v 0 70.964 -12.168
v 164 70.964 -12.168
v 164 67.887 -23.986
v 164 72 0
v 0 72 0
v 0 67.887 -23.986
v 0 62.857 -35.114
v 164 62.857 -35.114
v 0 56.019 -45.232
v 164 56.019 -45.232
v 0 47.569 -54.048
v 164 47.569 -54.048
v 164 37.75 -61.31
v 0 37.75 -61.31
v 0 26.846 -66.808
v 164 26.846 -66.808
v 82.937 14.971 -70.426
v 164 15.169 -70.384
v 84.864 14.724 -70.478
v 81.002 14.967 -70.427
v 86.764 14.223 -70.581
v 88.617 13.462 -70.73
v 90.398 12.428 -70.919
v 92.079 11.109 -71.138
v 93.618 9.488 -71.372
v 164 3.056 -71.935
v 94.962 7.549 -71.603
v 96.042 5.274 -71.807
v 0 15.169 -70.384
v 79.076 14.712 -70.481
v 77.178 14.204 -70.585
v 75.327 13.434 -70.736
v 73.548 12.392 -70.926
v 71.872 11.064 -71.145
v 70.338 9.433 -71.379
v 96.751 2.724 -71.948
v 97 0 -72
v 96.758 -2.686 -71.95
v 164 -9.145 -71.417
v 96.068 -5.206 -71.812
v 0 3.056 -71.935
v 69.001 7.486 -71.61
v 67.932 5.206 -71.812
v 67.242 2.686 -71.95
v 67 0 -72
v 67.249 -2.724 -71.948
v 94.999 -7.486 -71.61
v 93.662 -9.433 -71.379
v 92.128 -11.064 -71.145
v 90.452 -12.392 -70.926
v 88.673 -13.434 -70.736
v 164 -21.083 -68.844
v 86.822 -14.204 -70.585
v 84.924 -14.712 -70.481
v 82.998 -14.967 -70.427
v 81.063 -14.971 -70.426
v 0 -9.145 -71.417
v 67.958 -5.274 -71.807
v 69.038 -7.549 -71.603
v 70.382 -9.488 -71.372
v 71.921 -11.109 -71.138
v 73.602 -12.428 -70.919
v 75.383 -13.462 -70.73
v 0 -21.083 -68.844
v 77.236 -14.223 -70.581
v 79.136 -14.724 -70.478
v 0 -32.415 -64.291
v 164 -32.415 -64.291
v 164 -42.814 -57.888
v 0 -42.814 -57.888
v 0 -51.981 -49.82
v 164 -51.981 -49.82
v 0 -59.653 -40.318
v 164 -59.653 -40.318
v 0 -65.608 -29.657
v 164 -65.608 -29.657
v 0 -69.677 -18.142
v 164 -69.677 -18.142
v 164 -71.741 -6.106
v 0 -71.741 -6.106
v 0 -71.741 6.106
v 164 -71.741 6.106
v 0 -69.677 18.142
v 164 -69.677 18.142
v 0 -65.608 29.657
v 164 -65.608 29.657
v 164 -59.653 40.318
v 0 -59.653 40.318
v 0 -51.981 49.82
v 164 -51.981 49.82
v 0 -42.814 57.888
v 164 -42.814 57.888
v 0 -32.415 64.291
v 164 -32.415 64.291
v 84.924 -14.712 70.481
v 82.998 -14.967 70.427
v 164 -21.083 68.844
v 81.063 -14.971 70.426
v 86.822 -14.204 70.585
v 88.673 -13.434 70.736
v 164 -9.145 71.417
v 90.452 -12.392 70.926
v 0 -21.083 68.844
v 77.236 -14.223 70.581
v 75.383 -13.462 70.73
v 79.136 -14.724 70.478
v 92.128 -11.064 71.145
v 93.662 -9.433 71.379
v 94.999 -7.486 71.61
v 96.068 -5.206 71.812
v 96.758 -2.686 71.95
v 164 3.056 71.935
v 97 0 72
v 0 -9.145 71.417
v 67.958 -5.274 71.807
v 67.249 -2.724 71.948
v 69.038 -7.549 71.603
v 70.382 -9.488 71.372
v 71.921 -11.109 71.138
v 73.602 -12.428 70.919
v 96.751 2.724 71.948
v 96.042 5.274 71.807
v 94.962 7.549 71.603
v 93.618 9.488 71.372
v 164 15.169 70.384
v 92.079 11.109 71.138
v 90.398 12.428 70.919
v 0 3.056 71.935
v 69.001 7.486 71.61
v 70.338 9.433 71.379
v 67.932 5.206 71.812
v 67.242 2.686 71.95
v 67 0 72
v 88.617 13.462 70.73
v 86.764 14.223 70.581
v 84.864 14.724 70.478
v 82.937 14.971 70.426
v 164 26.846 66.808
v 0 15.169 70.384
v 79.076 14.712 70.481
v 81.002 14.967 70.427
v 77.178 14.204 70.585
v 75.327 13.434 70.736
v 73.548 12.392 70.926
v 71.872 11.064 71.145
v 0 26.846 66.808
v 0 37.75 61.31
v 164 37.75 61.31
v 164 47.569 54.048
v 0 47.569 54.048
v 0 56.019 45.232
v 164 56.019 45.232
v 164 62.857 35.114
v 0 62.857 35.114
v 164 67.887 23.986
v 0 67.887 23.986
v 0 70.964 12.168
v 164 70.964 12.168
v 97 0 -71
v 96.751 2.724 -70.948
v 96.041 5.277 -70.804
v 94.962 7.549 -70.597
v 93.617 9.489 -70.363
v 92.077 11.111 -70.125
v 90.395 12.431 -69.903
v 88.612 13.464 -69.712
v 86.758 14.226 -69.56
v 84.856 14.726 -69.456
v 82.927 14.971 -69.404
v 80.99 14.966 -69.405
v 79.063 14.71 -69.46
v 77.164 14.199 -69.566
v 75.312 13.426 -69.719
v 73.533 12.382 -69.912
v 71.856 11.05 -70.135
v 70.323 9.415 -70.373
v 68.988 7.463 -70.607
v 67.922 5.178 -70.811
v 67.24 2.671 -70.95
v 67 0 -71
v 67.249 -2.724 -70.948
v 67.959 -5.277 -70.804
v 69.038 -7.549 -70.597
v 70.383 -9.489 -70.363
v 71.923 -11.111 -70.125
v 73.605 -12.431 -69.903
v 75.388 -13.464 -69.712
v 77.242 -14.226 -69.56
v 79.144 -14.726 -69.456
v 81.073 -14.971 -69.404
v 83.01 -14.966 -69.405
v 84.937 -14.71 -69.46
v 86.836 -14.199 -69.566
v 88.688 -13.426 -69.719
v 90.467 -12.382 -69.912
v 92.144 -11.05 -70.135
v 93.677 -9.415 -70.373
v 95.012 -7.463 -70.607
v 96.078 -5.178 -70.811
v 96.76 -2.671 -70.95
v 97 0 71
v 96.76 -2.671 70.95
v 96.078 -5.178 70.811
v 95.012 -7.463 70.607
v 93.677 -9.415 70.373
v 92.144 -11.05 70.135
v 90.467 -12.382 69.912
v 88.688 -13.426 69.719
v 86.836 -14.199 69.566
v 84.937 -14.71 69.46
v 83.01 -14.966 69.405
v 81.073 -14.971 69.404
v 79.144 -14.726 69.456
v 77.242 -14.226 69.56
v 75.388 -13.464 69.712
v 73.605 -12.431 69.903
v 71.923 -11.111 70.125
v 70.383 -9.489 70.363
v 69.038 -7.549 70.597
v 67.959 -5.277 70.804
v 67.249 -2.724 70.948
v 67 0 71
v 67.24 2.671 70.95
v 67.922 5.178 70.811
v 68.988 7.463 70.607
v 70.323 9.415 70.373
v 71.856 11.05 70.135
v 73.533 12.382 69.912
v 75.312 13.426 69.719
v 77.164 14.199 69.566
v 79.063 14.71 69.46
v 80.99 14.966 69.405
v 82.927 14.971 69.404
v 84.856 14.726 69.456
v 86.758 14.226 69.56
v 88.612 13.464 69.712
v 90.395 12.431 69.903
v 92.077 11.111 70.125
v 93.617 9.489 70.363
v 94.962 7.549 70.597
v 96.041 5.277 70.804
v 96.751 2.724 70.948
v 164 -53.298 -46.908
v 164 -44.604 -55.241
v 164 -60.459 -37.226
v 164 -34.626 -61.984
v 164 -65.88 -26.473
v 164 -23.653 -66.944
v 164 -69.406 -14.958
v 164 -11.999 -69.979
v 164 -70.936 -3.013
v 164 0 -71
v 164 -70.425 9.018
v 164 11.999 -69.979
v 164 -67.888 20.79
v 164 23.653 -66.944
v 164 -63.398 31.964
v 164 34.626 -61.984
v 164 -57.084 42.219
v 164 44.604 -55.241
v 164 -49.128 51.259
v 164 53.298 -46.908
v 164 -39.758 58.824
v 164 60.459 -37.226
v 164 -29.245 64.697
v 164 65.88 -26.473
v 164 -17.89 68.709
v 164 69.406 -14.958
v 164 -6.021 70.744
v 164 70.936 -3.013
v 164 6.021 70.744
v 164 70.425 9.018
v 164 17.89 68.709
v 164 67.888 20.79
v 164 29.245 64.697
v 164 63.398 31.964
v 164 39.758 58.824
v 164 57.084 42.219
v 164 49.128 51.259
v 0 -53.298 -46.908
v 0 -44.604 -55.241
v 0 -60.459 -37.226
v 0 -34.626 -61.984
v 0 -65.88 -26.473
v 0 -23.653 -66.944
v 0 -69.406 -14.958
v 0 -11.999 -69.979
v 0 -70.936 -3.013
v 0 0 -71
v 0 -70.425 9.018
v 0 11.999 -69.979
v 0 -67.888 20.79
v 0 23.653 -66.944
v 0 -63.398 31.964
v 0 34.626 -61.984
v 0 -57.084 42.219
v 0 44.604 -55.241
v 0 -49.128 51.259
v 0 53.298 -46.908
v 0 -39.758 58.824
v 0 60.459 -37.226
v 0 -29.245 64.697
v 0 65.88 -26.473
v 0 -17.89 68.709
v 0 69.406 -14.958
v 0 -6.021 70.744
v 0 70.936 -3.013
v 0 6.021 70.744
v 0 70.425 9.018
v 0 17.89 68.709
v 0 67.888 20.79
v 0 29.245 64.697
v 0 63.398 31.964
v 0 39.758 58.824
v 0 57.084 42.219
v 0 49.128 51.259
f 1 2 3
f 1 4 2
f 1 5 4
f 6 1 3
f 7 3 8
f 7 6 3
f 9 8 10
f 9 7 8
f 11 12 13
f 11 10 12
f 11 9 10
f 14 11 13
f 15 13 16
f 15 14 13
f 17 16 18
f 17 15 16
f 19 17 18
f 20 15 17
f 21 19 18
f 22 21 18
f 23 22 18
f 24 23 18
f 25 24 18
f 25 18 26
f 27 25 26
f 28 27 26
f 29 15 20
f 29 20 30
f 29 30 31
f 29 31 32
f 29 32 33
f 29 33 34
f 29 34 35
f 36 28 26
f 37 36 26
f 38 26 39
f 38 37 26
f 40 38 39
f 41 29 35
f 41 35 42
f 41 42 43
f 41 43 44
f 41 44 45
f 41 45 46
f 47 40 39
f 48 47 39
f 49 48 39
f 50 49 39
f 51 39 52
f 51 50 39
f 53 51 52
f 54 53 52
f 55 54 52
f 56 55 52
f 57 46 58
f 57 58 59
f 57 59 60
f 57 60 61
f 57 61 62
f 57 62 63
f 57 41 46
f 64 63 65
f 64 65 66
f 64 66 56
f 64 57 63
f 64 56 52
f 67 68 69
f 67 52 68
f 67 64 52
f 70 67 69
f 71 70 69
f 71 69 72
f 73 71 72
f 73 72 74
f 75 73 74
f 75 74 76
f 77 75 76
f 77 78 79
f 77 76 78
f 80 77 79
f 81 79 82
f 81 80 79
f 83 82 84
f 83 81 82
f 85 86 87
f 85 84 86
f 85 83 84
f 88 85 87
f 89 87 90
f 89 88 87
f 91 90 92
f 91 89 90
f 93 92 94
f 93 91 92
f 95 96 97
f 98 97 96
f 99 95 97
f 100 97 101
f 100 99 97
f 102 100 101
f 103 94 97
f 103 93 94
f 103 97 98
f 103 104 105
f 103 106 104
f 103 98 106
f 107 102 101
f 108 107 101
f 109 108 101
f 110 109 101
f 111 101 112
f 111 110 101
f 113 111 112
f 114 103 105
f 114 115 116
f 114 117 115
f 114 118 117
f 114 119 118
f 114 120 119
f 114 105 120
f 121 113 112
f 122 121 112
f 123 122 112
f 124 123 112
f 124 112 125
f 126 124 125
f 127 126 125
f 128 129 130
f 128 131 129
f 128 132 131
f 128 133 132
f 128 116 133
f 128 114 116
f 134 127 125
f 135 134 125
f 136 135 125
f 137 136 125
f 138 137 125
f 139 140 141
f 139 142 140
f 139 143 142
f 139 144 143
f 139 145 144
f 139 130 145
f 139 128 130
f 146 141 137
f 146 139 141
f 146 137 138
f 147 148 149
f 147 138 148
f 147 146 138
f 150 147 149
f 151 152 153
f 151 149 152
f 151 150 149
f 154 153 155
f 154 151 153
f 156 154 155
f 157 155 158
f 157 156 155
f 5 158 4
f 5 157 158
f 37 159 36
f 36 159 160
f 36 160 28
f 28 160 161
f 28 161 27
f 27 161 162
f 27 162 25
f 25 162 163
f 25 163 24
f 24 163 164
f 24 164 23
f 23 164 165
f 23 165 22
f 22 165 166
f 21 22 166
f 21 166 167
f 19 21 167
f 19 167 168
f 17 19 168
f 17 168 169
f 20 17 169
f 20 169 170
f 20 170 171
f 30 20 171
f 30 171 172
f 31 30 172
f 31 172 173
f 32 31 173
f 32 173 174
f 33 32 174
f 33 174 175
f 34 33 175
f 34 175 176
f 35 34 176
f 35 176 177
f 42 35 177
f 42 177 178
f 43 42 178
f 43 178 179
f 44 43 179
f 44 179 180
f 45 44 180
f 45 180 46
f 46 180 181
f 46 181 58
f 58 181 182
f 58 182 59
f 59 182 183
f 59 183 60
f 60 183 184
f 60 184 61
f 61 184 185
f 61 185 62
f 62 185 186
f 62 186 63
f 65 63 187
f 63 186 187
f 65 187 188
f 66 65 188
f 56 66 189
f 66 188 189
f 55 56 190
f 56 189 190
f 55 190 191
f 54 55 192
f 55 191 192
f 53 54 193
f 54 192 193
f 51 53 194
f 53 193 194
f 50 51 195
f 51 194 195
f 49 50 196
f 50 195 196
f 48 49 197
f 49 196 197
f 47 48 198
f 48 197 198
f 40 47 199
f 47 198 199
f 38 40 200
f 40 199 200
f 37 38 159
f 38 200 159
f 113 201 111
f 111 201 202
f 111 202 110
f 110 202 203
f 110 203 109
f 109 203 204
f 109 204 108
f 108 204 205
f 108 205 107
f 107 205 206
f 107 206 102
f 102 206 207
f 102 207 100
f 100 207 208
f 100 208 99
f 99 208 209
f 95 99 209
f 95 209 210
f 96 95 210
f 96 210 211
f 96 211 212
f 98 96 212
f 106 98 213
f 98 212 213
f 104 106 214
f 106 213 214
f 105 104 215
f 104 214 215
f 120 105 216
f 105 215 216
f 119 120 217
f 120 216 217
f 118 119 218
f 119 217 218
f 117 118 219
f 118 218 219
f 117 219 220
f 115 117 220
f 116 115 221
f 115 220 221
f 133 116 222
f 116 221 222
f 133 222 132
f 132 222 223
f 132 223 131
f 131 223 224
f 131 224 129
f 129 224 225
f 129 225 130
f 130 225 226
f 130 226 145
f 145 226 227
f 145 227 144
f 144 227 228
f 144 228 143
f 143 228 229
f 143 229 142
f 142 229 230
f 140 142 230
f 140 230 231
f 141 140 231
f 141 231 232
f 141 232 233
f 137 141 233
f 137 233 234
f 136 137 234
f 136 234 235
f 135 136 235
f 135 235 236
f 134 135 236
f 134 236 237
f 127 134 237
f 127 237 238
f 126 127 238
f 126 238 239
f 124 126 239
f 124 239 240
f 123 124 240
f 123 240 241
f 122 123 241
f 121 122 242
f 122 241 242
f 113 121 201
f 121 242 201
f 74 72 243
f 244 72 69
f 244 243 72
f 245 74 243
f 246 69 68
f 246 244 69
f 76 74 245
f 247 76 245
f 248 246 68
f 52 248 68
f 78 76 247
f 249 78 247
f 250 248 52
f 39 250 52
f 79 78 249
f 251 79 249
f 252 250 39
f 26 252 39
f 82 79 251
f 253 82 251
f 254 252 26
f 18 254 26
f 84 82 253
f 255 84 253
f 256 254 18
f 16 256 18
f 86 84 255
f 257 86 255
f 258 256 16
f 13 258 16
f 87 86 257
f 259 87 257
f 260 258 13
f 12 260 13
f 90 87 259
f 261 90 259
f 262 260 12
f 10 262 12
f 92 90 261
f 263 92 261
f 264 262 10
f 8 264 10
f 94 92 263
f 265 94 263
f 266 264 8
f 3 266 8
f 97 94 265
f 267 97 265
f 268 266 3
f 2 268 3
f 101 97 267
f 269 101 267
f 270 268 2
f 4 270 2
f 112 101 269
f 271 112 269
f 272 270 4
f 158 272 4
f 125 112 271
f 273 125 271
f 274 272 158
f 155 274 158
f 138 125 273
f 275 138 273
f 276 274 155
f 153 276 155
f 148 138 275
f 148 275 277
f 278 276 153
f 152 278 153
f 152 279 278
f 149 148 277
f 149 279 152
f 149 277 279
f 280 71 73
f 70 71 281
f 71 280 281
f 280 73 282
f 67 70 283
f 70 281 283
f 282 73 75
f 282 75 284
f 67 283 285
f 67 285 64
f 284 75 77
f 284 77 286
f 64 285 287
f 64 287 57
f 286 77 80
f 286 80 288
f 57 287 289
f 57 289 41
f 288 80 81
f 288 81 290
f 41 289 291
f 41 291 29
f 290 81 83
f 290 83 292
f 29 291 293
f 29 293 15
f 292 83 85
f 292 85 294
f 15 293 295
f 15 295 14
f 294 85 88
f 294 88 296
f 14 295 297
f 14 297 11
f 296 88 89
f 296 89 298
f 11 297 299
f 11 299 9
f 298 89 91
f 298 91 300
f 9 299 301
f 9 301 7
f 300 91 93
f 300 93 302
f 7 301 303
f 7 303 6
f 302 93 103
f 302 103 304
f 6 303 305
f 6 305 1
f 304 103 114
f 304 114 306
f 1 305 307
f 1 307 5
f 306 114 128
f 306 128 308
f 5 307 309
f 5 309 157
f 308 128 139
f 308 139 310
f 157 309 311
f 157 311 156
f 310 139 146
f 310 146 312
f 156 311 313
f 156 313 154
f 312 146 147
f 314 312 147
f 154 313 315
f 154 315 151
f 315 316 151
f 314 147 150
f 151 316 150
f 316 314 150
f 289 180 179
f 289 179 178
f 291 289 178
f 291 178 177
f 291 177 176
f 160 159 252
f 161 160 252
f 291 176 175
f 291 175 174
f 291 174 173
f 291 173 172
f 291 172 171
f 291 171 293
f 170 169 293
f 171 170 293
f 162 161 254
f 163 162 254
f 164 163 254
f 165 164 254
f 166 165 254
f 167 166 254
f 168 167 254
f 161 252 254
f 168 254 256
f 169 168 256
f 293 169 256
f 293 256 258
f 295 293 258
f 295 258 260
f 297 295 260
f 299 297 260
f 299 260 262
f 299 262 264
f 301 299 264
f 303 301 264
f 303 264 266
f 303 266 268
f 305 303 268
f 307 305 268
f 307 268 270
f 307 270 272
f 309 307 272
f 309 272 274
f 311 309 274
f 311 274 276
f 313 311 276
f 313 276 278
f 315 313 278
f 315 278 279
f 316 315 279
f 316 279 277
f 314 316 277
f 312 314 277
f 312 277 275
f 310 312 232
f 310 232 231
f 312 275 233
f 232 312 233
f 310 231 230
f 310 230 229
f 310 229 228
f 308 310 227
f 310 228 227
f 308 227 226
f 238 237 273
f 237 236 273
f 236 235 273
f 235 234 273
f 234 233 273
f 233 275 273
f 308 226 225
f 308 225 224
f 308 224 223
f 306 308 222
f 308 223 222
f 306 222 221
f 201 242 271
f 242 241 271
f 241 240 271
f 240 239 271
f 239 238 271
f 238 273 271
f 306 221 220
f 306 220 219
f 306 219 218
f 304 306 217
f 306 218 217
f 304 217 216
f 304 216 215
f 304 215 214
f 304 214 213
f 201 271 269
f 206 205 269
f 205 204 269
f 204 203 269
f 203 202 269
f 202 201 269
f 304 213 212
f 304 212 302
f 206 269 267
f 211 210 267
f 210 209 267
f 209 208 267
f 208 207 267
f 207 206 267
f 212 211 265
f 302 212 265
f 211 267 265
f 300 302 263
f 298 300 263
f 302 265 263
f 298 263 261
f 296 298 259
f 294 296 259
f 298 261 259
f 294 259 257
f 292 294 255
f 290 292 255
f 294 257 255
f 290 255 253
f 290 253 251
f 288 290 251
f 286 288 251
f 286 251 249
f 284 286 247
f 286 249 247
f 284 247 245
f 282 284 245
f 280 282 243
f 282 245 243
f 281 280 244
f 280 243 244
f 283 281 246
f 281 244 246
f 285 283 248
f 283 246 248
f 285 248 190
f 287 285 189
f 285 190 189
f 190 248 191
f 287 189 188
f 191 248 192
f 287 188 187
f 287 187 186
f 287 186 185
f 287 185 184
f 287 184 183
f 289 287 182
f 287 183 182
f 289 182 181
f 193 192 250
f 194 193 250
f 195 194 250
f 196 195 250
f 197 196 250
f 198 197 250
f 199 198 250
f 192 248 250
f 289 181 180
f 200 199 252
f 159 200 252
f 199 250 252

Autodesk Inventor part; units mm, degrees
ref_plane "YZ Plane" through (0, 0, 0) normal (1, 0, 0) x (0, 1, 0)
ref_plane "XZ Plane" through (0, 0, 0) normal (0, 1, 0) x (-1, 0, 0)
ref_plane "XY Plane" through (0, 0, 0) normal (0, 0, 1) x (1, 0, 0)
sketch "Sketch1" plane through (0, 0, 0) normal (1, 0, 0) x (0, 1, 0)
  circle A0 centre (0, 0) radius 72
  dimension "d0" = 144
extrude "Extrusion1" add sketch "Sketch1" along normal blind 164
sketch "Sketch2" plane through (164, 0, 0) normal (1, 0, 0) x (0, 0, -1)
  circle A0 centre (0, 0) radius 71
  dimension "d3" = 142
extrude "Extrusion2" cut sketch "Sketch2" against normal blind 300
sketch "Sketch3" plane through (0, 0, 0) normal (0, 0, 1) x (1, 0, 0)
  line L0 (0, 0) -> (82, 0)
  circle A0 centre (82, 0) radius 15
  dimension "d6" = 82
  dimension "d7" = 30
extrude "Extrusion3" cut sketch "Sketch3" along normal mid plane 164
properties part number "Shield Center"
